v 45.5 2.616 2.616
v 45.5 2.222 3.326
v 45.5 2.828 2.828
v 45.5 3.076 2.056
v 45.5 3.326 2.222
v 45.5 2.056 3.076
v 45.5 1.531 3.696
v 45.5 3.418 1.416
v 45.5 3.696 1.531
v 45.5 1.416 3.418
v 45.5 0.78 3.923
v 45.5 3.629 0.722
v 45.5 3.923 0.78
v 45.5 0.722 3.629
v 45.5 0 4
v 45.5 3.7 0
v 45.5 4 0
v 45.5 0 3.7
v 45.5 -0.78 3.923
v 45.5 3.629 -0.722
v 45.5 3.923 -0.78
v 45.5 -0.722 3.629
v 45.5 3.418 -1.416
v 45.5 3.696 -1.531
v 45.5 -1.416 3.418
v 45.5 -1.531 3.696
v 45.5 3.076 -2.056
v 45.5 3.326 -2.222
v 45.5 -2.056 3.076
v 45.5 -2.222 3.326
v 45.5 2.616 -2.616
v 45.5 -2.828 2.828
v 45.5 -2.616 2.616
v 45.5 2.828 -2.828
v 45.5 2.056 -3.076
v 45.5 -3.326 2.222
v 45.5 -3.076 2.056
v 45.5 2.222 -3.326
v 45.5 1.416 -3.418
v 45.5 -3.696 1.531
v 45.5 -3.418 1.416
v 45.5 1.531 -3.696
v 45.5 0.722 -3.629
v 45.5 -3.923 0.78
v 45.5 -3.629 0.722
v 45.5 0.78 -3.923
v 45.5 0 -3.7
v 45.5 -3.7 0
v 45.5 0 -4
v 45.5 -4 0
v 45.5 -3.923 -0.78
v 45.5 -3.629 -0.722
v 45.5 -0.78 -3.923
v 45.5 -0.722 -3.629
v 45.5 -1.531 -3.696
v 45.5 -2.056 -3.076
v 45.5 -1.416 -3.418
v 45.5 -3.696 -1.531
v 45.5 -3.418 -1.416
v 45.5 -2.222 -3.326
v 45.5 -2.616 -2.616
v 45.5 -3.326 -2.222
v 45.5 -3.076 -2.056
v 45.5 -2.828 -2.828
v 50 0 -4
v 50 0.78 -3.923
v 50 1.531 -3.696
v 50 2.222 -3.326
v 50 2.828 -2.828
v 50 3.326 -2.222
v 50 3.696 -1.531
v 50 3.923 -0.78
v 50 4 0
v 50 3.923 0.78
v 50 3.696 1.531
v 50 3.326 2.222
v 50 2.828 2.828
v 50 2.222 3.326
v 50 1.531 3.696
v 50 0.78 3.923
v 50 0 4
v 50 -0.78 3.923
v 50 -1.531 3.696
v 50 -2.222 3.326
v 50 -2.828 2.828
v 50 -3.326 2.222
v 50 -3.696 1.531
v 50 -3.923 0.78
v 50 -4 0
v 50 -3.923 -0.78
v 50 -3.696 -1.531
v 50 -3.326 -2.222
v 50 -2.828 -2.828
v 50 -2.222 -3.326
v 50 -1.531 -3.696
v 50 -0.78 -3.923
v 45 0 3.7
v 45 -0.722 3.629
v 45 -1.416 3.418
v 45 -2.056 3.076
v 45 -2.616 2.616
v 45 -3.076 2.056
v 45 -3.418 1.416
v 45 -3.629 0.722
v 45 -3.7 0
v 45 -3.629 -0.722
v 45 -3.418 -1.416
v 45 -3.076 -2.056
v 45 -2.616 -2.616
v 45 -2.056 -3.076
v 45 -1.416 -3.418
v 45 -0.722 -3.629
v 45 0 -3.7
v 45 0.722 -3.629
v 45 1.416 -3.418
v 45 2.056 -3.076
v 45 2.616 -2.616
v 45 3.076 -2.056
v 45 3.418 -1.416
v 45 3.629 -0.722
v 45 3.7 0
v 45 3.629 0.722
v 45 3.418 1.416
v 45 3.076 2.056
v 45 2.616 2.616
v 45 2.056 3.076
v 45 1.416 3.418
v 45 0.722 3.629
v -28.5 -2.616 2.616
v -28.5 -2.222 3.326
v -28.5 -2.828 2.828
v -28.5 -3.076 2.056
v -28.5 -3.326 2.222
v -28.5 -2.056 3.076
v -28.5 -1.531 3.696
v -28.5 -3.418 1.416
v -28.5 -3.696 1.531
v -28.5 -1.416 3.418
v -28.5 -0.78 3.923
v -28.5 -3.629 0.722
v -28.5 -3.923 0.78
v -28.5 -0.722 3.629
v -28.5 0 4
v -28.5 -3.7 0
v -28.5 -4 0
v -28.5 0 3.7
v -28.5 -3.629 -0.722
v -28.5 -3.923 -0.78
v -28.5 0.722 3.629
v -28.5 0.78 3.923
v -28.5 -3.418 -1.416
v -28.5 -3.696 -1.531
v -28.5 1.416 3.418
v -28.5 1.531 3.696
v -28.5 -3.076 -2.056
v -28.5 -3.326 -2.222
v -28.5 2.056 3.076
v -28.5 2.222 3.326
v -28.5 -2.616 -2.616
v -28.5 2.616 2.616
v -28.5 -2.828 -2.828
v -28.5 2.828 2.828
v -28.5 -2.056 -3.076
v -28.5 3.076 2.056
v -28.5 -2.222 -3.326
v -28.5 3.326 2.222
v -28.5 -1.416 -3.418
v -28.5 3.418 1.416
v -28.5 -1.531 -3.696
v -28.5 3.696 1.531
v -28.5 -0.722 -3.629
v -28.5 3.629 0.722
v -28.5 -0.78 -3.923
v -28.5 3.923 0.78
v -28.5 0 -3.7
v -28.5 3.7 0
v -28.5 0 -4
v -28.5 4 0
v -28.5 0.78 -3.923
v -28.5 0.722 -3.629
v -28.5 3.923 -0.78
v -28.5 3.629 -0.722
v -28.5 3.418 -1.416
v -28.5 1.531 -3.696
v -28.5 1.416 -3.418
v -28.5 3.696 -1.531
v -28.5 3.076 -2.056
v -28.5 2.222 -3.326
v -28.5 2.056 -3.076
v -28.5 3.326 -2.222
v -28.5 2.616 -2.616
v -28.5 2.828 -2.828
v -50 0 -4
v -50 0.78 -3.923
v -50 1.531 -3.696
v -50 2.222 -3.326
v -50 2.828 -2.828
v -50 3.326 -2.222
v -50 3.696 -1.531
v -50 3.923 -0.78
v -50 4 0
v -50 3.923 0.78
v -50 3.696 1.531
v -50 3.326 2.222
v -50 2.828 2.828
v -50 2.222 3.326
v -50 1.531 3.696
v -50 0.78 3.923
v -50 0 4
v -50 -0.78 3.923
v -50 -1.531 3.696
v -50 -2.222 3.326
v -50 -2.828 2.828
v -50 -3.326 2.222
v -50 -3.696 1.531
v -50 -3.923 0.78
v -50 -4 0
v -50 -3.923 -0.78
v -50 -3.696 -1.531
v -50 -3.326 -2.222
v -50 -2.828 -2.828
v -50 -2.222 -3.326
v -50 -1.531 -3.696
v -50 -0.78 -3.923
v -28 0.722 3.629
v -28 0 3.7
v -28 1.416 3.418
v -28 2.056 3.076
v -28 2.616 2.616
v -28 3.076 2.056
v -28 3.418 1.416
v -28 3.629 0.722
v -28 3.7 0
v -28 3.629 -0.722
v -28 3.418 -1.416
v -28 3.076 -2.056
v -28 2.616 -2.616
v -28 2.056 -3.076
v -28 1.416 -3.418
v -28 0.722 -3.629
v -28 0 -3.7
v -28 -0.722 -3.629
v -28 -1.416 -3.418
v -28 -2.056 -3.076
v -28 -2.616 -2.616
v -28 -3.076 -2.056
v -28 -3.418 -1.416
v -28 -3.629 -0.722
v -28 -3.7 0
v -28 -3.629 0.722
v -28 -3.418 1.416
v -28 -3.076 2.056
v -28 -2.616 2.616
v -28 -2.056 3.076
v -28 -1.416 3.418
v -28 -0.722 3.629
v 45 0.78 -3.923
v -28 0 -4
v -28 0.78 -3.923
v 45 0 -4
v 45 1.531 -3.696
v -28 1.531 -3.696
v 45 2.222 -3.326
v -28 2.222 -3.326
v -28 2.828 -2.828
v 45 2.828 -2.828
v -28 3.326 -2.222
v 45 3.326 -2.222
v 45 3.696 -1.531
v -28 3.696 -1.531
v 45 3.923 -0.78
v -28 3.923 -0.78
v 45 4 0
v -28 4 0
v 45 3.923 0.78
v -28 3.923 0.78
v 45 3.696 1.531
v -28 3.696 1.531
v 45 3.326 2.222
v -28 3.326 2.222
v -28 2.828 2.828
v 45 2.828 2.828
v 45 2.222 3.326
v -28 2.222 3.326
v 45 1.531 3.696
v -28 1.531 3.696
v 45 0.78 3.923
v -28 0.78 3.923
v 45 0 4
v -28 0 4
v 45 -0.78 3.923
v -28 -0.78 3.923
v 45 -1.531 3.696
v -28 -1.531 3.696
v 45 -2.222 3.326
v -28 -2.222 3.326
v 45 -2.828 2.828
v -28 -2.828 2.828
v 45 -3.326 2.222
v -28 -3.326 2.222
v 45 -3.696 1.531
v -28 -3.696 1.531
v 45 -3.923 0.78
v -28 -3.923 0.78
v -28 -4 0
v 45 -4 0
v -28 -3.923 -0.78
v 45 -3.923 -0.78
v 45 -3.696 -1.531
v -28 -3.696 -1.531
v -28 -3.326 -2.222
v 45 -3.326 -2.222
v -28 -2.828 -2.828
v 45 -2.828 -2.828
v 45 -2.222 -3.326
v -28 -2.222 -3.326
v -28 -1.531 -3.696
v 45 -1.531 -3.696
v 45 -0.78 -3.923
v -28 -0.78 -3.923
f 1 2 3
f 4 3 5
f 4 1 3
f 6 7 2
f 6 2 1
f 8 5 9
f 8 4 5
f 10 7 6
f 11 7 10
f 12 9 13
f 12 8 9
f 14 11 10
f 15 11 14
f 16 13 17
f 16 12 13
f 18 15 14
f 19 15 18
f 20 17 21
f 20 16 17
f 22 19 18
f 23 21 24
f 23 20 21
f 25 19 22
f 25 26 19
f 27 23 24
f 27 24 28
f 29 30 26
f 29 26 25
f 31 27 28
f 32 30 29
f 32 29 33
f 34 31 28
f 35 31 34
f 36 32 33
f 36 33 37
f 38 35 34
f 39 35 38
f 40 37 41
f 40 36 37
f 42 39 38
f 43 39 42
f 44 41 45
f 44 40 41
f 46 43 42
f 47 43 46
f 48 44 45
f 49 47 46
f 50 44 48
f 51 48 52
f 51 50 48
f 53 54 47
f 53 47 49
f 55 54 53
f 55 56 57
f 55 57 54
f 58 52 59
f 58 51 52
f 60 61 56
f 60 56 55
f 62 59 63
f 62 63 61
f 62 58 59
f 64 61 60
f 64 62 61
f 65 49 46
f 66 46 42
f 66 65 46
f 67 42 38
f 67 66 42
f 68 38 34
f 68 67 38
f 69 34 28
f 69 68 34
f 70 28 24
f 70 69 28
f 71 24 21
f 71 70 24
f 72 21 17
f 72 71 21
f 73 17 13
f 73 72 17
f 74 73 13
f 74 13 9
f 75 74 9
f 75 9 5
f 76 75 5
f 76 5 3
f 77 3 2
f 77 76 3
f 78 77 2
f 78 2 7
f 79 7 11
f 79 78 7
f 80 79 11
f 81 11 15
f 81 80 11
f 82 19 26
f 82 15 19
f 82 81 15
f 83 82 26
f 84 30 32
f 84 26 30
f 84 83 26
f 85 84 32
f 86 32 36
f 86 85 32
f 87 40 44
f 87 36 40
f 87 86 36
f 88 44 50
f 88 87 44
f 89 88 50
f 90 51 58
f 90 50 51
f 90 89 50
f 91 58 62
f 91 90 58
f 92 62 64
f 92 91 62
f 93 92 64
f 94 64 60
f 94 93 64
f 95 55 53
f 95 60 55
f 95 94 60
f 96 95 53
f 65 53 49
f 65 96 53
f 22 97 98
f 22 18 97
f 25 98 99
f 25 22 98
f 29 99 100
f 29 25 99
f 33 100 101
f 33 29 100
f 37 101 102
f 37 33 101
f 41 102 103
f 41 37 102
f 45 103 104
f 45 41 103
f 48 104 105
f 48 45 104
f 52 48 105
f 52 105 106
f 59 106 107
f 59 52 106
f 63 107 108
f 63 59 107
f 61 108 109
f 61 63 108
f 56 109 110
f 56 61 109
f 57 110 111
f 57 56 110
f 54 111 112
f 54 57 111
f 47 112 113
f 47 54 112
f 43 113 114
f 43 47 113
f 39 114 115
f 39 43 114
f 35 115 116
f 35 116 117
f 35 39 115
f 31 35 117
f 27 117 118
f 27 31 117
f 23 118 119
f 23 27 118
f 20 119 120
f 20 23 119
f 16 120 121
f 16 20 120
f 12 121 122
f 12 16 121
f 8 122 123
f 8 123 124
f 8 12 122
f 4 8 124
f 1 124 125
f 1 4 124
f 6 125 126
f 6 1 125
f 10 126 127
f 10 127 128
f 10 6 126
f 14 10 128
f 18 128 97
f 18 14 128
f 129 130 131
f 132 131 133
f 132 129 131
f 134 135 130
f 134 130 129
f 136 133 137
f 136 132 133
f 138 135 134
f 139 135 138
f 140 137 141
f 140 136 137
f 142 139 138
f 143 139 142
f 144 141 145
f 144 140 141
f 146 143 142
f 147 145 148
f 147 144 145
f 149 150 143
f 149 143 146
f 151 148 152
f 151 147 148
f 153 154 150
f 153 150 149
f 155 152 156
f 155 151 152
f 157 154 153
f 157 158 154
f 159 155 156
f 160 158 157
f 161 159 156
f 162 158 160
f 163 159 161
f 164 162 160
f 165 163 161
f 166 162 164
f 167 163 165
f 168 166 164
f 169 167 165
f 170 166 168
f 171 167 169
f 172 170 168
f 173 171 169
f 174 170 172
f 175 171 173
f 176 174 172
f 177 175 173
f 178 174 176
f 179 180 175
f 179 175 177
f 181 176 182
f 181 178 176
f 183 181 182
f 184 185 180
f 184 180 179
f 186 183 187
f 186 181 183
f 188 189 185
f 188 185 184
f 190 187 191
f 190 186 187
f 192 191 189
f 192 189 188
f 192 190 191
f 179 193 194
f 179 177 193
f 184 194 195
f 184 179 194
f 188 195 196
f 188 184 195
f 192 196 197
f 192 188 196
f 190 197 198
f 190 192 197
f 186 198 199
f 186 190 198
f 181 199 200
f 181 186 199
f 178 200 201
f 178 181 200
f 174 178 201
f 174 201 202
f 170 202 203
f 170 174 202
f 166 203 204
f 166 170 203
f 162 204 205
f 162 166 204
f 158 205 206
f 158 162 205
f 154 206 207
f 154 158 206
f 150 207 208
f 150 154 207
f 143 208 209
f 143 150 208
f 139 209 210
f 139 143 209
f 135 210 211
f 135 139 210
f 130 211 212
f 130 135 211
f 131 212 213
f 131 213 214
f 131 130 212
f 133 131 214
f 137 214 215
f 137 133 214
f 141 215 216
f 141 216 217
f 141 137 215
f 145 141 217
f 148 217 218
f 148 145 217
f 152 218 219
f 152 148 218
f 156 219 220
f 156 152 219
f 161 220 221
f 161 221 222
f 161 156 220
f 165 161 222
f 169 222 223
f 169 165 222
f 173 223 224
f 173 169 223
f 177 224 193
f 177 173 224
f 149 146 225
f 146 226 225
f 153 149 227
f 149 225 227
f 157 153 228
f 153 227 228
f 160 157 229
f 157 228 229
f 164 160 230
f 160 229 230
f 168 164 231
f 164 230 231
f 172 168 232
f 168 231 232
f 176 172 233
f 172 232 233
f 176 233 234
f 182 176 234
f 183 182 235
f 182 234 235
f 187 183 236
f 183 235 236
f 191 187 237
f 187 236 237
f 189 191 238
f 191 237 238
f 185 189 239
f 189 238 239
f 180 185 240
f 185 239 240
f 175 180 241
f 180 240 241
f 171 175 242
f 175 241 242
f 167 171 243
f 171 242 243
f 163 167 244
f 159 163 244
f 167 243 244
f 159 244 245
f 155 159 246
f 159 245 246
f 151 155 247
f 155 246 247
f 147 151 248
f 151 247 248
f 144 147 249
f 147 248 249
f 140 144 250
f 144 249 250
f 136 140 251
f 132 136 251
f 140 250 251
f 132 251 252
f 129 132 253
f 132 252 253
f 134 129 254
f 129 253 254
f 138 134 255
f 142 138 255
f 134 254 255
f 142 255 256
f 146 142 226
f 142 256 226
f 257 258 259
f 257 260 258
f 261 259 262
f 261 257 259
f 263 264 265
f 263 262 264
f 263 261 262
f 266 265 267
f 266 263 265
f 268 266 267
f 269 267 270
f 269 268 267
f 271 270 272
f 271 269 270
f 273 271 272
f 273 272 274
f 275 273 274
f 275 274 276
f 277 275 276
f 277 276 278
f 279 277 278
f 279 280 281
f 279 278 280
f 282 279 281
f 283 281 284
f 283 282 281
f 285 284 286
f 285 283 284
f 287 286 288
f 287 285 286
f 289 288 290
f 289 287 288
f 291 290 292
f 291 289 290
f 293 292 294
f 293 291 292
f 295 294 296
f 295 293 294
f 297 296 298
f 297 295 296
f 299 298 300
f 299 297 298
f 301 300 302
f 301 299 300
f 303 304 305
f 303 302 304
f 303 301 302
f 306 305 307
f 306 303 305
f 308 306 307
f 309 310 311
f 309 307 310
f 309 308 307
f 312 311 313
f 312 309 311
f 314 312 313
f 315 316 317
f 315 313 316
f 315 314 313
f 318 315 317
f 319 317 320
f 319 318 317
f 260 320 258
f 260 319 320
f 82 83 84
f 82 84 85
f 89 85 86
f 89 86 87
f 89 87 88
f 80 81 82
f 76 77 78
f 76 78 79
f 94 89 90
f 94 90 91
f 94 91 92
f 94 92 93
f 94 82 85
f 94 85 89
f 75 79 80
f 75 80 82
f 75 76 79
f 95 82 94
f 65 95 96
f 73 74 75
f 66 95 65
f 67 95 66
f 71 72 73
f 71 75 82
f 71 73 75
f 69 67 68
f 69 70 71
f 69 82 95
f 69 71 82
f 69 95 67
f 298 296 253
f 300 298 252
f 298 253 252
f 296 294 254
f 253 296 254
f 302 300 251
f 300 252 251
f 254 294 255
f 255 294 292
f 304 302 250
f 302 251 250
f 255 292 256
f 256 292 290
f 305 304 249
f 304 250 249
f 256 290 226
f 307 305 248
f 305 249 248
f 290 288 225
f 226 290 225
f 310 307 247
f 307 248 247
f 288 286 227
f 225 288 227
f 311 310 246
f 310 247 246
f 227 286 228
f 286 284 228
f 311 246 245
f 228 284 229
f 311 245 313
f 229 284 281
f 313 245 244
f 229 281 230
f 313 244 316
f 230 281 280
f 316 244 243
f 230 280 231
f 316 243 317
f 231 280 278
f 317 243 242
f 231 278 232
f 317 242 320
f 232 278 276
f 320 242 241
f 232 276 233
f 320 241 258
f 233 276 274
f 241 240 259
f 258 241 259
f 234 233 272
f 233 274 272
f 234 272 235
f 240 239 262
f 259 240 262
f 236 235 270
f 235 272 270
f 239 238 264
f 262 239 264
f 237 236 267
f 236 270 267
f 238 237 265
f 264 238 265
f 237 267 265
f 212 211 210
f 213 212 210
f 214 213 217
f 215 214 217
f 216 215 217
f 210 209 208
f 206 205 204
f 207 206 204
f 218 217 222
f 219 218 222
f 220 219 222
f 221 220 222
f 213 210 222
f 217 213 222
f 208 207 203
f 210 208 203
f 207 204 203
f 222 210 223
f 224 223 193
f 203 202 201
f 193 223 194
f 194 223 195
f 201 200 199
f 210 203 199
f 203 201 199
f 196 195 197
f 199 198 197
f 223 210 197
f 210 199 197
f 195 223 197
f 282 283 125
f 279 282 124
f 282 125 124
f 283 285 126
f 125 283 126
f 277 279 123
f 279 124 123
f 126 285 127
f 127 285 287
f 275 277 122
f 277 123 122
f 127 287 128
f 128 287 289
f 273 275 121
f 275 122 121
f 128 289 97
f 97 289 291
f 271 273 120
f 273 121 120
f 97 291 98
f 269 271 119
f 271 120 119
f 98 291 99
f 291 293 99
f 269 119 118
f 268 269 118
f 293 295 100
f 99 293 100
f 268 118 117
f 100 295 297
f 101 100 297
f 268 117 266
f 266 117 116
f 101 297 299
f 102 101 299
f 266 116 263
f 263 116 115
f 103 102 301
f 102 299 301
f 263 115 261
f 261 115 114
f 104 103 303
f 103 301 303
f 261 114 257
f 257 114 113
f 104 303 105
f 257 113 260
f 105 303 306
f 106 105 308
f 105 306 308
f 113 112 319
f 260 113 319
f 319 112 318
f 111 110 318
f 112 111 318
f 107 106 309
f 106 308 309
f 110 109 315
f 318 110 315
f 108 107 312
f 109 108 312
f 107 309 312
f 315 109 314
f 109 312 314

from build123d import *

# Parameters (mm, degrees)
SKETCH1_R           = 4
BOSS_EXTRUDE1_DEPTH = 50
SKETCH2_W           = 0.5
SKETCH2_H           = 0.3
SKETCH3_W           = 0.5
SKETCH3_H           = 0.3


with BuildPart() as part:
    # Sketch1 → Boss-Extrude1 (new, symmetric)
    with BuildSketch(Plane(origin=(0, 0, 0), x_dir=(0, 0, -1), z_dir=(1, 0, 0))):
        Circle(SKETCH1_R)
    extrude(amount=BOSS_EXTRUDE1_DEPTH, both=True)

    # Sketch2 → Cut-Revolve1 (revolve, cut)
    with BuildSketch(Plane.XY, mode=Mode.PRIVATE) as cut_revolve1_sk:
        with Locations((45.25, 3.85)):
            Rectangle(SKETCH2_W, SKETCH2_H)
    revolve(cut_revolve1_sk.sketch.rotate(Axis((0, 0, 0), (1, 0, 0)), 90), axis=Axis((0, 0, 0), (1, 0, 0)), mode=Mode.SUBTRACT)

    # Sketch3 → Cut-Revolve2 (revolve, cut)
    with BuildSketch(Plane.XY, mode=Mode.PRIVATE) as cut_revolve2_sk:
        with Locations((-28.25, 3.85)):
            Rectangle(SKETCH3_W, SKETCH3_H)
    revolve(cut_revolve2_sk.sketch.rotate(Axis((0, 0, 0), (-1, 0, 0)), 270), axis=Axis((0, 0, 0), (-1, 0, 0)), mode=Mode.SUBTRACT)


solid = part.part
